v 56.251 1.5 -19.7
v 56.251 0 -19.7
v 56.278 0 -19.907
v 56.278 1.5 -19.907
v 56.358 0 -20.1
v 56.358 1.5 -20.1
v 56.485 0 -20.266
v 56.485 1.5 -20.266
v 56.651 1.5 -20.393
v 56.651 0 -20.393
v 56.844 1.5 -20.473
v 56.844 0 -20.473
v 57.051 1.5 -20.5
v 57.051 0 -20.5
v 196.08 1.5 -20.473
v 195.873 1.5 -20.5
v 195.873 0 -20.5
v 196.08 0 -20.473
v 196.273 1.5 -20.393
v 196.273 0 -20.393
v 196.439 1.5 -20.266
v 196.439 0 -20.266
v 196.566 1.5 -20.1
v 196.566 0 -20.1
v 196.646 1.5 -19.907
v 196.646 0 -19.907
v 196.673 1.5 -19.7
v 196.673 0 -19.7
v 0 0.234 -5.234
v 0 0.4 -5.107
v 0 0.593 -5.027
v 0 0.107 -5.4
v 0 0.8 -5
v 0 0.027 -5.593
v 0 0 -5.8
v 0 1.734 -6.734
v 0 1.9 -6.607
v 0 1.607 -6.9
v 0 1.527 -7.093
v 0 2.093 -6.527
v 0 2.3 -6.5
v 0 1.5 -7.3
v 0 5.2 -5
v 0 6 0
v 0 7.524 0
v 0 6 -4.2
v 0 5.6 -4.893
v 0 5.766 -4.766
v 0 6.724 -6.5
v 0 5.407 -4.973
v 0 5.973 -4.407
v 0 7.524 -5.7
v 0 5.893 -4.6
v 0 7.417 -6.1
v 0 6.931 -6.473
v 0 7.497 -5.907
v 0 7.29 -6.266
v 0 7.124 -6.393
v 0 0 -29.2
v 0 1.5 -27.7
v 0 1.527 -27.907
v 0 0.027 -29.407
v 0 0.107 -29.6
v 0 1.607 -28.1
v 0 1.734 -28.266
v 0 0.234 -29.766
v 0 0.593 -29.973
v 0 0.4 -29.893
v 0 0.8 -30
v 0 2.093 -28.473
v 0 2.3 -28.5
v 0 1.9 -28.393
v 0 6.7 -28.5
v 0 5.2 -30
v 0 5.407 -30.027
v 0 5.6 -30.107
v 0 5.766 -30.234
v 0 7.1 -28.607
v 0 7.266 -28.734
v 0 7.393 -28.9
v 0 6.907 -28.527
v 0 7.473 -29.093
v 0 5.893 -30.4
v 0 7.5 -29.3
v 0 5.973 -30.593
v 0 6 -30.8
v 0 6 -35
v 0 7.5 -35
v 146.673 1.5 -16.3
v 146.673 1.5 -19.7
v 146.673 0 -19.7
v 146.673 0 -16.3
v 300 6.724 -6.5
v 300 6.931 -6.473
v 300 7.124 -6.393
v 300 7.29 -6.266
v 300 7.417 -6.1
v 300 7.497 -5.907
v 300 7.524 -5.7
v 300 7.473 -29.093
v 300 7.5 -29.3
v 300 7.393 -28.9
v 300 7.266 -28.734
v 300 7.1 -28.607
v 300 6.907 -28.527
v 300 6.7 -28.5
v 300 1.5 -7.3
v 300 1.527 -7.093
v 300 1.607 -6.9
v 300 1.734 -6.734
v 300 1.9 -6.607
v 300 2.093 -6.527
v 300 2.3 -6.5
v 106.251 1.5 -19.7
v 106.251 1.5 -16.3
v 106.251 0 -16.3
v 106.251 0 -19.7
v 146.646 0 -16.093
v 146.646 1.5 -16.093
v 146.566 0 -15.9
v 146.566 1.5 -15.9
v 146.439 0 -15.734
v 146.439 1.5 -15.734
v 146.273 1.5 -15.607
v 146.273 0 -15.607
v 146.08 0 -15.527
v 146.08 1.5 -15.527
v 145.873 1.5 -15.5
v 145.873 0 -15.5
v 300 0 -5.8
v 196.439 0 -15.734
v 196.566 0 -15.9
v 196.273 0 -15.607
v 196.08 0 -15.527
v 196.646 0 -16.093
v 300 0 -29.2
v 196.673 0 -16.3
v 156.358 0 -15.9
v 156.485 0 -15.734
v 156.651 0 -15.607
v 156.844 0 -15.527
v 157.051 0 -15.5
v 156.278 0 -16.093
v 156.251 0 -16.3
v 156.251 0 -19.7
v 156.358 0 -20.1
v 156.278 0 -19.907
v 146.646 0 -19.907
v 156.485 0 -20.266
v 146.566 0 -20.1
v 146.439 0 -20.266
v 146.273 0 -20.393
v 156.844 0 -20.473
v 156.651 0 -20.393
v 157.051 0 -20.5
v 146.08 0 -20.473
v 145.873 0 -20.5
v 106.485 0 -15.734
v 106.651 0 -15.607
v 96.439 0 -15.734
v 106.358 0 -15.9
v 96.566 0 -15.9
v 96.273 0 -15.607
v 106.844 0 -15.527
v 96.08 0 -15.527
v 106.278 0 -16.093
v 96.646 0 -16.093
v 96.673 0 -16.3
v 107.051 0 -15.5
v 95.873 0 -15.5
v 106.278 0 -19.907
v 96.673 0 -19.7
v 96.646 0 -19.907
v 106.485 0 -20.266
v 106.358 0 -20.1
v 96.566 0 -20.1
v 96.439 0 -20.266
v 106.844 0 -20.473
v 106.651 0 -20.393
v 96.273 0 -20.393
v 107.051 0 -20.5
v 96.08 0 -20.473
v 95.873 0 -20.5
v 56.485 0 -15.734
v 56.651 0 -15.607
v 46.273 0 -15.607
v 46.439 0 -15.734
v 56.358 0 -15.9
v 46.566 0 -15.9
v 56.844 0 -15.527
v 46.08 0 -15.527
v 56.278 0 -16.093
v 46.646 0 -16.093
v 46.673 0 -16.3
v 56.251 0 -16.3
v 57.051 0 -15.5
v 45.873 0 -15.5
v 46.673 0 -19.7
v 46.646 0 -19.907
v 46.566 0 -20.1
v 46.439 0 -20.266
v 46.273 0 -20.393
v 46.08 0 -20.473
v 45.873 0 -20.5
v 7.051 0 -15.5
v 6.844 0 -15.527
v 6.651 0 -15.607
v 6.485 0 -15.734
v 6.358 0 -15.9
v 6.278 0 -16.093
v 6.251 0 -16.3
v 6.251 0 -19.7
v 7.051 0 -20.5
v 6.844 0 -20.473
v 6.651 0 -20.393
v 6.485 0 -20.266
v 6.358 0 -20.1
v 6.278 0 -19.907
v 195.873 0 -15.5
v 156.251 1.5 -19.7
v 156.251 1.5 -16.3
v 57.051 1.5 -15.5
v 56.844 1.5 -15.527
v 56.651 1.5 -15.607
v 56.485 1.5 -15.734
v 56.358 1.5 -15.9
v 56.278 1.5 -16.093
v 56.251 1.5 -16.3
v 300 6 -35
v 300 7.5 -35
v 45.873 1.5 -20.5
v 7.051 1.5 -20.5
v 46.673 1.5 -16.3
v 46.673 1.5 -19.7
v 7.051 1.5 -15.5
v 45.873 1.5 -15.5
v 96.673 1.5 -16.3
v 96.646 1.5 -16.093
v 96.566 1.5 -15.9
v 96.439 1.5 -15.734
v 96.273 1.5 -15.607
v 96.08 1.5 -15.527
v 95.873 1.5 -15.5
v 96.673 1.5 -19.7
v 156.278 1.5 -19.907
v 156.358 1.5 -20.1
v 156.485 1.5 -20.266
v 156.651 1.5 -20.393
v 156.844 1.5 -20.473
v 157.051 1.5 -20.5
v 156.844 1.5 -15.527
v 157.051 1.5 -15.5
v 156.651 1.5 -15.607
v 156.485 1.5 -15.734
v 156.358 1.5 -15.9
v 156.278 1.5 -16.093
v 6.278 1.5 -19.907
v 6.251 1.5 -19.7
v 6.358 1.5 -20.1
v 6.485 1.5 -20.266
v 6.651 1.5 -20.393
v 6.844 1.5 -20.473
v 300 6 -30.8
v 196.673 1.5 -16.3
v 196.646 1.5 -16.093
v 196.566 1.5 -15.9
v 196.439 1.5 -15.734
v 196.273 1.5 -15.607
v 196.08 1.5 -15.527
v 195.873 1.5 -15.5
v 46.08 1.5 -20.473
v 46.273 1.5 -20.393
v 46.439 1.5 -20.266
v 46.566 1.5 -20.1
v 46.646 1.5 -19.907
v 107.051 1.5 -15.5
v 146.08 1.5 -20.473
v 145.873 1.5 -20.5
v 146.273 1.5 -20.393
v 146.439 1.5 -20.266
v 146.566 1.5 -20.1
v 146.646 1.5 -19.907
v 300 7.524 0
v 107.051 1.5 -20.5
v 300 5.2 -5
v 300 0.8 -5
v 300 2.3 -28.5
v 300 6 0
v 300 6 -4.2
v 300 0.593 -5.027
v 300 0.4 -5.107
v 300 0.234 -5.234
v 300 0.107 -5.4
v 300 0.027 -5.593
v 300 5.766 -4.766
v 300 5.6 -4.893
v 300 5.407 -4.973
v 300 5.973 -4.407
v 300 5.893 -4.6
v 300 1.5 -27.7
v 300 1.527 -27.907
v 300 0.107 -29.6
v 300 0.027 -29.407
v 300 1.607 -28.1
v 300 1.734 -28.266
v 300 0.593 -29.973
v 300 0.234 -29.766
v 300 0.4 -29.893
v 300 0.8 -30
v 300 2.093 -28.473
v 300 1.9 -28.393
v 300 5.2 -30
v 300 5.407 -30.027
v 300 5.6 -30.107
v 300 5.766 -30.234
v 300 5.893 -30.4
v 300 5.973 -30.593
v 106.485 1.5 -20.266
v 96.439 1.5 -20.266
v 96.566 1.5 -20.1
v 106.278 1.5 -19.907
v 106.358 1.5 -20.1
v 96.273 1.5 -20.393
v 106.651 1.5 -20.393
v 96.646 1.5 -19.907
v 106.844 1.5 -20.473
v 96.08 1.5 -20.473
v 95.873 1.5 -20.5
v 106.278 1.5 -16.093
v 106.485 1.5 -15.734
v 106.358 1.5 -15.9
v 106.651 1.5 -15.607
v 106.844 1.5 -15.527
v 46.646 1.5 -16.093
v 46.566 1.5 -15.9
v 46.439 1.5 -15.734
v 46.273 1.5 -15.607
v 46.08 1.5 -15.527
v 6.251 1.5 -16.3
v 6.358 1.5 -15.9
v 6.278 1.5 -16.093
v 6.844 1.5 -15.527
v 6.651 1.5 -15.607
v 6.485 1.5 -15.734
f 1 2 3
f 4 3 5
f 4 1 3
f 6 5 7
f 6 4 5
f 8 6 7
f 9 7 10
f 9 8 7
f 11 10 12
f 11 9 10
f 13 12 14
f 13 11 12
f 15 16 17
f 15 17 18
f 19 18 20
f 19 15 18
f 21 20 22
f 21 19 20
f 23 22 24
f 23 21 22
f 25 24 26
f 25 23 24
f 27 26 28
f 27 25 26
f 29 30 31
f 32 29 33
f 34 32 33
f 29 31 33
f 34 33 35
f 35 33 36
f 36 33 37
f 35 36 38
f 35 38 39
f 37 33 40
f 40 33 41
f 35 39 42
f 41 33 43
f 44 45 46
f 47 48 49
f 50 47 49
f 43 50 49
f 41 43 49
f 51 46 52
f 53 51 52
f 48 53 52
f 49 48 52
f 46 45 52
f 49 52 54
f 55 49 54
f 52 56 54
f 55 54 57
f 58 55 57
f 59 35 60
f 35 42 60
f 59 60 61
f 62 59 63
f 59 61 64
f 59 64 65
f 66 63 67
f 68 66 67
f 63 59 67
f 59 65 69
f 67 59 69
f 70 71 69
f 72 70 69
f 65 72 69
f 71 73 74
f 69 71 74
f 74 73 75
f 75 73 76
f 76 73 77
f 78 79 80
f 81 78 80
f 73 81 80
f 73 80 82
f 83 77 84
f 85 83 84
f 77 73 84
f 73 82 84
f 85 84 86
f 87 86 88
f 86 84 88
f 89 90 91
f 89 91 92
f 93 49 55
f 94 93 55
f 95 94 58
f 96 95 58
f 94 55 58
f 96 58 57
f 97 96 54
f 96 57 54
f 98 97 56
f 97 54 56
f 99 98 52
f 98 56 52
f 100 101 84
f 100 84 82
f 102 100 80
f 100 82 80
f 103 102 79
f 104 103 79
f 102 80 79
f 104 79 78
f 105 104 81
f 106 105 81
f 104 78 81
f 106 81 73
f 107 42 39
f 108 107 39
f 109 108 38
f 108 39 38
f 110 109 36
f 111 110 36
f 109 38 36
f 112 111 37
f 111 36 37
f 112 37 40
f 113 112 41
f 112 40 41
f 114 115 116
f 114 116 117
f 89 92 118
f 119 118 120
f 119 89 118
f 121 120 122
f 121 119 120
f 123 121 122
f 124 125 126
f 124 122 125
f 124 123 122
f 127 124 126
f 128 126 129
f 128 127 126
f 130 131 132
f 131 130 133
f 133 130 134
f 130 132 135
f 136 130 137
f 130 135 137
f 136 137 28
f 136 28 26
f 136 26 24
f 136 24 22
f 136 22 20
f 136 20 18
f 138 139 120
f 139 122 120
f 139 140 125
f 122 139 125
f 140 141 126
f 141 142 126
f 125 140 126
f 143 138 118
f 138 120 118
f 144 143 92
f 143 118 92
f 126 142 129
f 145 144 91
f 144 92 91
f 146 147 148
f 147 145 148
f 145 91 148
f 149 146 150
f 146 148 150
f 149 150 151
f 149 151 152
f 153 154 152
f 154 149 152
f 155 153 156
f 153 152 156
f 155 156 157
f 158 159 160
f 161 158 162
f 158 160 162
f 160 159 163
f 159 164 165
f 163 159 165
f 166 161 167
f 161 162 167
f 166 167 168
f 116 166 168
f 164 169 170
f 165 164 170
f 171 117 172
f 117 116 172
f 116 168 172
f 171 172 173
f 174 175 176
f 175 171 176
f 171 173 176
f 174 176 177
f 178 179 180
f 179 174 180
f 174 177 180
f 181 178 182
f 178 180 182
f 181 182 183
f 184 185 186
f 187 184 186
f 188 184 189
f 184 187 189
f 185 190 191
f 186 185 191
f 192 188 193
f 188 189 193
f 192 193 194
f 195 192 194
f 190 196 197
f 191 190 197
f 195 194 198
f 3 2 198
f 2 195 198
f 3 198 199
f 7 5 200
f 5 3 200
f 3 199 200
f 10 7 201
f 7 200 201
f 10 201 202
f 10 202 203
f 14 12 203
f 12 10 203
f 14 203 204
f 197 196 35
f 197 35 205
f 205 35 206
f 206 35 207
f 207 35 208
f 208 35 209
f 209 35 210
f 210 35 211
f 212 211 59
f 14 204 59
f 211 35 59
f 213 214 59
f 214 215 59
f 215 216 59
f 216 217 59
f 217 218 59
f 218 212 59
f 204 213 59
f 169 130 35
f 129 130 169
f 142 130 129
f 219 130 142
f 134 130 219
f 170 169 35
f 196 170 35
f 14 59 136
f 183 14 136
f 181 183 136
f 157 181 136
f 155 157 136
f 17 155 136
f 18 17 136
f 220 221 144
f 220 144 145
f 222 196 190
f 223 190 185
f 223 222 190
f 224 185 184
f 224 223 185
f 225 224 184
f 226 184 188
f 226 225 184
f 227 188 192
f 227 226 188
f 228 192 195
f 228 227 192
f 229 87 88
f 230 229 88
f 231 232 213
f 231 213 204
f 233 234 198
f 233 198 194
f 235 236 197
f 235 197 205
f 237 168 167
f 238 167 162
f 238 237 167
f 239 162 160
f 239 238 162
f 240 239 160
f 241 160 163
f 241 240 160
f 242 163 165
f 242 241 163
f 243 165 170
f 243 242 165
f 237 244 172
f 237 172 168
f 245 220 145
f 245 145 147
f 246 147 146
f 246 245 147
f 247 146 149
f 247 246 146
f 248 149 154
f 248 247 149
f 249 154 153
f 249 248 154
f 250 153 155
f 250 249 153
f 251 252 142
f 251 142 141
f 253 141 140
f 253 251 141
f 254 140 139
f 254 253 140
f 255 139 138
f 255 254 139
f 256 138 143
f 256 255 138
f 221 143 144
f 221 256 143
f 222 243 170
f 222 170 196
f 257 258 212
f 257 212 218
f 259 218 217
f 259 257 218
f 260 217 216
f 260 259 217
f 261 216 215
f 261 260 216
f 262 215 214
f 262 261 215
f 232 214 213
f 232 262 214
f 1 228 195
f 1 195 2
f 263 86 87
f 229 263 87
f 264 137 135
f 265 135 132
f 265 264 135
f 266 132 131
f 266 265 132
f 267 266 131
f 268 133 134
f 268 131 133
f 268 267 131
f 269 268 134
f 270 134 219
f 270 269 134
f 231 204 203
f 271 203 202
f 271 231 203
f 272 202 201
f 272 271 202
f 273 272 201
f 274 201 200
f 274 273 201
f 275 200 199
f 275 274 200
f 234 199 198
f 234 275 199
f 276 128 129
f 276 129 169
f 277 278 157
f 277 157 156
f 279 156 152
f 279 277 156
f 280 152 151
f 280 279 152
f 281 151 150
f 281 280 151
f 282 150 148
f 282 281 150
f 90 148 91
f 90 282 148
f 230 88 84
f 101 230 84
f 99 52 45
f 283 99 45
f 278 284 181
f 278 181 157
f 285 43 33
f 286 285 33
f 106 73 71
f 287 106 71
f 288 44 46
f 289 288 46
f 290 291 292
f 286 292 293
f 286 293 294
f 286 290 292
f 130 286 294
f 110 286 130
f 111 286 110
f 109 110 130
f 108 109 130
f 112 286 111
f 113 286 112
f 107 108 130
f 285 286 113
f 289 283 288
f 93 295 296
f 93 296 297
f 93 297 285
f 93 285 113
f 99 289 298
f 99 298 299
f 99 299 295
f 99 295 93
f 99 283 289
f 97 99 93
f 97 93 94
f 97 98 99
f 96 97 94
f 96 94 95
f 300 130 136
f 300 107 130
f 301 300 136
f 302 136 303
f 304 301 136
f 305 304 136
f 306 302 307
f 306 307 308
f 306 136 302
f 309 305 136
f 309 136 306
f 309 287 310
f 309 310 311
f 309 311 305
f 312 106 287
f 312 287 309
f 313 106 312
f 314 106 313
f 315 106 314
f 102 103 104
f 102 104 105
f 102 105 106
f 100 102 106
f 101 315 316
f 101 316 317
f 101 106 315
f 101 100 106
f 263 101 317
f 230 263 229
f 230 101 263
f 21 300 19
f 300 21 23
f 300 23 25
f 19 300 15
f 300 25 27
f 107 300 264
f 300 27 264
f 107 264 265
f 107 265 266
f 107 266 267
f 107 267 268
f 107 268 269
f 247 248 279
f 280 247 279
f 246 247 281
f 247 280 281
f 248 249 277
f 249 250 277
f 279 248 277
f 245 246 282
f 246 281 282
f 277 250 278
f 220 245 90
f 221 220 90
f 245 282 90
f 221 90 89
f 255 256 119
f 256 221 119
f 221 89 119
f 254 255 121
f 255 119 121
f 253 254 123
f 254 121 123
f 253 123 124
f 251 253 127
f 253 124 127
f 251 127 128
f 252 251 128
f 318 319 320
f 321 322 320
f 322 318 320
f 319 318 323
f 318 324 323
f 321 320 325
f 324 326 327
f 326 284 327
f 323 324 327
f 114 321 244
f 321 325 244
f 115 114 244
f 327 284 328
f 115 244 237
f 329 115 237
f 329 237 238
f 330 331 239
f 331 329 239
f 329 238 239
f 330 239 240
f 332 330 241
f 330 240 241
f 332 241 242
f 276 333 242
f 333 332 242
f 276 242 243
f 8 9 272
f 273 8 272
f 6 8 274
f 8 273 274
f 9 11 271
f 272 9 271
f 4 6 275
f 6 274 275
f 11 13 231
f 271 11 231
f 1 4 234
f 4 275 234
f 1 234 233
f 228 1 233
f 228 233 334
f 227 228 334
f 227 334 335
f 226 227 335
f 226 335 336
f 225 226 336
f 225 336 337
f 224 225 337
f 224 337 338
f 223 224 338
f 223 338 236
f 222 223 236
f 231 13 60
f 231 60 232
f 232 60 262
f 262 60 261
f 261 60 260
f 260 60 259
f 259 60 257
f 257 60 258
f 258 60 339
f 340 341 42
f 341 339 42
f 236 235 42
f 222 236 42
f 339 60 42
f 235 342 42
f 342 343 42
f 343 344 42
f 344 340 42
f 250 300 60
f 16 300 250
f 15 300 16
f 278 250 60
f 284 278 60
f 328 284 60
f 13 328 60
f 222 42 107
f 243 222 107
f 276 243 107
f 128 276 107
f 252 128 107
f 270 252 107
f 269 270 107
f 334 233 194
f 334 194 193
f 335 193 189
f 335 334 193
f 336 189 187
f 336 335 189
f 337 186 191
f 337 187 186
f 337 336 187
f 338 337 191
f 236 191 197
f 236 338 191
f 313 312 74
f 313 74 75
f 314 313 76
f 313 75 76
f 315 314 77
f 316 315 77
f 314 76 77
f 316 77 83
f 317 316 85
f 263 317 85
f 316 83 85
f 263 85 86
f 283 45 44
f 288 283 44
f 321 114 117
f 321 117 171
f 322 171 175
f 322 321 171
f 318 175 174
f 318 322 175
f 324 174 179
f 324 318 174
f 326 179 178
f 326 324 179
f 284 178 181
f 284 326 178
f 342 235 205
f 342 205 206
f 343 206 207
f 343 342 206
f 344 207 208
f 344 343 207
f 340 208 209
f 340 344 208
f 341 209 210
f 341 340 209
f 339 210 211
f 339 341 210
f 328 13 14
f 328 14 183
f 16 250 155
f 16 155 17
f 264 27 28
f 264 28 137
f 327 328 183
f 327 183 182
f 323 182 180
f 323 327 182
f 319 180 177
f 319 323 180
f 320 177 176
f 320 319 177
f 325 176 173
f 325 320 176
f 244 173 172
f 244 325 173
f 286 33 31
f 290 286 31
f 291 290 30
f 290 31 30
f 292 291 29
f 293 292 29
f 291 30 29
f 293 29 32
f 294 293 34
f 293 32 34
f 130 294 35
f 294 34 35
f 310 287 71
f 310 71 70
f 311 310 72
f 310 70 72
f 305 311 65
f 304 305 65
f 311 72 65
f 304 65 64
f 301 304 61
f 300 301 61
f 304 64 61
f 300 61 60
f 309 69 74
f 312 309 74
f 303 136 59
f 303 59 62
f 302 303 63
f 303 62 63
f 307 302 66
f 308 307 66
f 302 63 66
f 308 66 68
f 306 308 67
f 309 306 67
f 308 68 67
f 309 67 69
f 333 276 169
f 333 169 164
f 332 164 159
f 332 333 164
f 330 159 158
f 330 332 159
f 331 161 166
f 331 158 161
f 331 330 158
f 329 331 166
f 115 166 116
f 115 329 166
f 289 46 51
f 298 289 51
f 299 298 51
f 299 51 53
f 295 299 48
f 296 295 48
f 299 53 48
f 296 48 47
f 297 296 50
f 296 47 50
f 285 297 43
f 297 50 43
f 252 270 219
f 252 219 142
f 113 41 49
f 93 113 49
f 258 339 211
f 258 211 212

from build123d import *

# Parameters (mm, degrees)
EXTRUDE_1_DEPTH     = 300
CUT_EXTRUDE_1_DEPTH = 10


with BuildPart() as part:
    # Эскиз1 → Бобышка-Вытянуть1 (new body)
    with BuildSketch(Plane(origin=(0, 0, 0), x_dir=(0, 0, -1), z_dir=(1, 0, 0))):
        with BuildLine():
            Line((0, 7.524096324), (0, 6))
            Line((0, 6), (4.2, 6))
            ThreePointArc((4.2, 6), (4.765685425, 5.765685425), (5, 5.2))
            Line((5, 5.2), (5, 0.8))
            ThreePointArc((5, 0.8), (5.234314575, 0.234314575), (5.8, 0))
            Line((5.8, 0), (29.2, 0))
            ThreePointArc((29.2, 0), (29.765685425, 0.234314575), (30, 0.8))
            Line((30, 0.8), (30, 5.2))
            ThreePointArc((30, 5.2), (30.234314575, 5.765685425), (30.8, 6))
            Line((30.8, 6), (35, 6))
            Line((35, 6), (35, 7.5))
            Line((35, 7.5), (29.3, 7.5))
            ThreePointArc((29.3, 7.5), (28.734314575, 7.265685425), (28.5, 6.7))
            Line((28.5, 6.7), (28.5, 2.3))
            ThreePointArc((28.5, 2.3), (28.265685425, 1.734314575), (27.7, 1.5))
            Line((27.7, 1.5), (7.3, 1.5))
            ThreePointArc((7.3, 1.5), (6.734314575, 1.734314575), (6.5, 2.3))
            Line((6.5, 2.3), (6.5, 6.724096324))
            ThreePointArc((6.5, 6.724096324), (6.265685425, 7.289781749), (5.7, 7.524096324))
            Line((5.7, 7.524096324), (0, 7.524096324))
        make_face()
    extrude(amount=EXTRUDE_1_DEPTH)

    # Эскиз2 → Вырез-Вытянуть1 (cut)
    with BuildSketch(Plane(origin=(0, 1.5, 0), x_dir=(1, 0, 0), z_dir=(0, 1, 0))):
        with BuildLine():
            Line((57.050825201, 20.5), (95.873378283, 20.5))
            ThreePointArc((95.873378283, 20.5), (96.439063708, 20.265685425), (96.673378283, 19.7))
            Line((96.673378283, 19.7), (96.673378283, 16.3))
            ThreePointArc((96.673378283, 16.3), (96.439063708, 15.734314575), (95.873378283, 15.5))
            Line((95.873378283, 15.5), (57.050825201, 15.5))
            ThreePointArc((57.050825201, 15.5), (56.485139776, 15.734314575), (56.250825201, 16.3))
            Line((56.250825201, 16.3), (56.250825201, 19.7))
            ThreePointArc((56.250825201, 19.7), (56.485139776, 20.265685425), (57.050825201, 20.5))
        make_face()
        with BuildLine():
            Line((7.050825201, 20.5), (45.873378283, 20.5))
            ThreePointArc((45.873378283, 20.5), (46.439063708, 20.265685425), (46.673378283, 19.7))
            Line((46.673378283, 19.7), (46.673378283, 16.3))
            ThreePointArc((46.673378283, 16.3), (46.439063708, 15.734314575), (45.873378283, 15.5))
            Line((45.873378283, 15.5), (7.050825201, 15.5))
            ThreePointArc((7.050825201, 15.5), (6.485139776, 15.734314575), (6.250825201, 16.3))
            Line((6.250825201, 16.3), (6.250825201, 19.7))
            ThreePointArc((6.250825201, 19.7), (6.485139776, 20.265685425), (7.050825201, 20.5))
        make_face()
        with BuildLine():
            Line((107.050825201, 20.5), (145.873378283, 20.5))
            ThreePointArc((145.873378283, 20.5), (146.439063708, 20.265685425), (146.673378283, 19.7))
            Line((146.673378283, 19.7), (146.673378283, 16.3))
            ThreePointArc((146.673378283, 16.3), (146.439063708, 15.734314575), (145.873378283, 15.5))
            Line((145.873378283, 15.5), (107.050825201, 15.5))
            ThreePointArc((107.050825201, 15.5), (106.485139776, 15.734314575), (106.250825201, 16.3))
            Line((106.250825201, 16.3), (106.250825201, 19.7))
            ThreePointArc((106.250825201, 19.7), (106.485139776, 20.265685425), (107.050825201, 20.5))
        make_face()
        with BuildLine():
            Line((157.050825201, 20.5), (195.873378283, 20.5))
            ThreePointArc((195.873378283, 20.5), (196.439063708, 20.265685425), (196.673378283, 19.7))
            Line((196.673378283, 19.7), (196.673378283, 16.3))
            ThreePointArc((196.673378283, 16.3), (196.439063708, 15.734314575), (195.873378283, 15.5))
            Line((195.873378283, 15.5), (157.050825201, 15.5))
            ThreePointArc((157.050825201, 15.5), (156.485139776, 15.734314575), (156.250825201, 16.3))
            Line((156.250825201, 16.3), (156.250825201, 19.7))
            ThreePointArc((156.250825201, 19.7), (156.485139776, 20.265685425), (157.050825201, 20.5))
        make_face()
    extrude(amount=-CUT_EXTRUDE_1_DEPTH, mode=Mode.SUBTRACT)


solid = part.part
